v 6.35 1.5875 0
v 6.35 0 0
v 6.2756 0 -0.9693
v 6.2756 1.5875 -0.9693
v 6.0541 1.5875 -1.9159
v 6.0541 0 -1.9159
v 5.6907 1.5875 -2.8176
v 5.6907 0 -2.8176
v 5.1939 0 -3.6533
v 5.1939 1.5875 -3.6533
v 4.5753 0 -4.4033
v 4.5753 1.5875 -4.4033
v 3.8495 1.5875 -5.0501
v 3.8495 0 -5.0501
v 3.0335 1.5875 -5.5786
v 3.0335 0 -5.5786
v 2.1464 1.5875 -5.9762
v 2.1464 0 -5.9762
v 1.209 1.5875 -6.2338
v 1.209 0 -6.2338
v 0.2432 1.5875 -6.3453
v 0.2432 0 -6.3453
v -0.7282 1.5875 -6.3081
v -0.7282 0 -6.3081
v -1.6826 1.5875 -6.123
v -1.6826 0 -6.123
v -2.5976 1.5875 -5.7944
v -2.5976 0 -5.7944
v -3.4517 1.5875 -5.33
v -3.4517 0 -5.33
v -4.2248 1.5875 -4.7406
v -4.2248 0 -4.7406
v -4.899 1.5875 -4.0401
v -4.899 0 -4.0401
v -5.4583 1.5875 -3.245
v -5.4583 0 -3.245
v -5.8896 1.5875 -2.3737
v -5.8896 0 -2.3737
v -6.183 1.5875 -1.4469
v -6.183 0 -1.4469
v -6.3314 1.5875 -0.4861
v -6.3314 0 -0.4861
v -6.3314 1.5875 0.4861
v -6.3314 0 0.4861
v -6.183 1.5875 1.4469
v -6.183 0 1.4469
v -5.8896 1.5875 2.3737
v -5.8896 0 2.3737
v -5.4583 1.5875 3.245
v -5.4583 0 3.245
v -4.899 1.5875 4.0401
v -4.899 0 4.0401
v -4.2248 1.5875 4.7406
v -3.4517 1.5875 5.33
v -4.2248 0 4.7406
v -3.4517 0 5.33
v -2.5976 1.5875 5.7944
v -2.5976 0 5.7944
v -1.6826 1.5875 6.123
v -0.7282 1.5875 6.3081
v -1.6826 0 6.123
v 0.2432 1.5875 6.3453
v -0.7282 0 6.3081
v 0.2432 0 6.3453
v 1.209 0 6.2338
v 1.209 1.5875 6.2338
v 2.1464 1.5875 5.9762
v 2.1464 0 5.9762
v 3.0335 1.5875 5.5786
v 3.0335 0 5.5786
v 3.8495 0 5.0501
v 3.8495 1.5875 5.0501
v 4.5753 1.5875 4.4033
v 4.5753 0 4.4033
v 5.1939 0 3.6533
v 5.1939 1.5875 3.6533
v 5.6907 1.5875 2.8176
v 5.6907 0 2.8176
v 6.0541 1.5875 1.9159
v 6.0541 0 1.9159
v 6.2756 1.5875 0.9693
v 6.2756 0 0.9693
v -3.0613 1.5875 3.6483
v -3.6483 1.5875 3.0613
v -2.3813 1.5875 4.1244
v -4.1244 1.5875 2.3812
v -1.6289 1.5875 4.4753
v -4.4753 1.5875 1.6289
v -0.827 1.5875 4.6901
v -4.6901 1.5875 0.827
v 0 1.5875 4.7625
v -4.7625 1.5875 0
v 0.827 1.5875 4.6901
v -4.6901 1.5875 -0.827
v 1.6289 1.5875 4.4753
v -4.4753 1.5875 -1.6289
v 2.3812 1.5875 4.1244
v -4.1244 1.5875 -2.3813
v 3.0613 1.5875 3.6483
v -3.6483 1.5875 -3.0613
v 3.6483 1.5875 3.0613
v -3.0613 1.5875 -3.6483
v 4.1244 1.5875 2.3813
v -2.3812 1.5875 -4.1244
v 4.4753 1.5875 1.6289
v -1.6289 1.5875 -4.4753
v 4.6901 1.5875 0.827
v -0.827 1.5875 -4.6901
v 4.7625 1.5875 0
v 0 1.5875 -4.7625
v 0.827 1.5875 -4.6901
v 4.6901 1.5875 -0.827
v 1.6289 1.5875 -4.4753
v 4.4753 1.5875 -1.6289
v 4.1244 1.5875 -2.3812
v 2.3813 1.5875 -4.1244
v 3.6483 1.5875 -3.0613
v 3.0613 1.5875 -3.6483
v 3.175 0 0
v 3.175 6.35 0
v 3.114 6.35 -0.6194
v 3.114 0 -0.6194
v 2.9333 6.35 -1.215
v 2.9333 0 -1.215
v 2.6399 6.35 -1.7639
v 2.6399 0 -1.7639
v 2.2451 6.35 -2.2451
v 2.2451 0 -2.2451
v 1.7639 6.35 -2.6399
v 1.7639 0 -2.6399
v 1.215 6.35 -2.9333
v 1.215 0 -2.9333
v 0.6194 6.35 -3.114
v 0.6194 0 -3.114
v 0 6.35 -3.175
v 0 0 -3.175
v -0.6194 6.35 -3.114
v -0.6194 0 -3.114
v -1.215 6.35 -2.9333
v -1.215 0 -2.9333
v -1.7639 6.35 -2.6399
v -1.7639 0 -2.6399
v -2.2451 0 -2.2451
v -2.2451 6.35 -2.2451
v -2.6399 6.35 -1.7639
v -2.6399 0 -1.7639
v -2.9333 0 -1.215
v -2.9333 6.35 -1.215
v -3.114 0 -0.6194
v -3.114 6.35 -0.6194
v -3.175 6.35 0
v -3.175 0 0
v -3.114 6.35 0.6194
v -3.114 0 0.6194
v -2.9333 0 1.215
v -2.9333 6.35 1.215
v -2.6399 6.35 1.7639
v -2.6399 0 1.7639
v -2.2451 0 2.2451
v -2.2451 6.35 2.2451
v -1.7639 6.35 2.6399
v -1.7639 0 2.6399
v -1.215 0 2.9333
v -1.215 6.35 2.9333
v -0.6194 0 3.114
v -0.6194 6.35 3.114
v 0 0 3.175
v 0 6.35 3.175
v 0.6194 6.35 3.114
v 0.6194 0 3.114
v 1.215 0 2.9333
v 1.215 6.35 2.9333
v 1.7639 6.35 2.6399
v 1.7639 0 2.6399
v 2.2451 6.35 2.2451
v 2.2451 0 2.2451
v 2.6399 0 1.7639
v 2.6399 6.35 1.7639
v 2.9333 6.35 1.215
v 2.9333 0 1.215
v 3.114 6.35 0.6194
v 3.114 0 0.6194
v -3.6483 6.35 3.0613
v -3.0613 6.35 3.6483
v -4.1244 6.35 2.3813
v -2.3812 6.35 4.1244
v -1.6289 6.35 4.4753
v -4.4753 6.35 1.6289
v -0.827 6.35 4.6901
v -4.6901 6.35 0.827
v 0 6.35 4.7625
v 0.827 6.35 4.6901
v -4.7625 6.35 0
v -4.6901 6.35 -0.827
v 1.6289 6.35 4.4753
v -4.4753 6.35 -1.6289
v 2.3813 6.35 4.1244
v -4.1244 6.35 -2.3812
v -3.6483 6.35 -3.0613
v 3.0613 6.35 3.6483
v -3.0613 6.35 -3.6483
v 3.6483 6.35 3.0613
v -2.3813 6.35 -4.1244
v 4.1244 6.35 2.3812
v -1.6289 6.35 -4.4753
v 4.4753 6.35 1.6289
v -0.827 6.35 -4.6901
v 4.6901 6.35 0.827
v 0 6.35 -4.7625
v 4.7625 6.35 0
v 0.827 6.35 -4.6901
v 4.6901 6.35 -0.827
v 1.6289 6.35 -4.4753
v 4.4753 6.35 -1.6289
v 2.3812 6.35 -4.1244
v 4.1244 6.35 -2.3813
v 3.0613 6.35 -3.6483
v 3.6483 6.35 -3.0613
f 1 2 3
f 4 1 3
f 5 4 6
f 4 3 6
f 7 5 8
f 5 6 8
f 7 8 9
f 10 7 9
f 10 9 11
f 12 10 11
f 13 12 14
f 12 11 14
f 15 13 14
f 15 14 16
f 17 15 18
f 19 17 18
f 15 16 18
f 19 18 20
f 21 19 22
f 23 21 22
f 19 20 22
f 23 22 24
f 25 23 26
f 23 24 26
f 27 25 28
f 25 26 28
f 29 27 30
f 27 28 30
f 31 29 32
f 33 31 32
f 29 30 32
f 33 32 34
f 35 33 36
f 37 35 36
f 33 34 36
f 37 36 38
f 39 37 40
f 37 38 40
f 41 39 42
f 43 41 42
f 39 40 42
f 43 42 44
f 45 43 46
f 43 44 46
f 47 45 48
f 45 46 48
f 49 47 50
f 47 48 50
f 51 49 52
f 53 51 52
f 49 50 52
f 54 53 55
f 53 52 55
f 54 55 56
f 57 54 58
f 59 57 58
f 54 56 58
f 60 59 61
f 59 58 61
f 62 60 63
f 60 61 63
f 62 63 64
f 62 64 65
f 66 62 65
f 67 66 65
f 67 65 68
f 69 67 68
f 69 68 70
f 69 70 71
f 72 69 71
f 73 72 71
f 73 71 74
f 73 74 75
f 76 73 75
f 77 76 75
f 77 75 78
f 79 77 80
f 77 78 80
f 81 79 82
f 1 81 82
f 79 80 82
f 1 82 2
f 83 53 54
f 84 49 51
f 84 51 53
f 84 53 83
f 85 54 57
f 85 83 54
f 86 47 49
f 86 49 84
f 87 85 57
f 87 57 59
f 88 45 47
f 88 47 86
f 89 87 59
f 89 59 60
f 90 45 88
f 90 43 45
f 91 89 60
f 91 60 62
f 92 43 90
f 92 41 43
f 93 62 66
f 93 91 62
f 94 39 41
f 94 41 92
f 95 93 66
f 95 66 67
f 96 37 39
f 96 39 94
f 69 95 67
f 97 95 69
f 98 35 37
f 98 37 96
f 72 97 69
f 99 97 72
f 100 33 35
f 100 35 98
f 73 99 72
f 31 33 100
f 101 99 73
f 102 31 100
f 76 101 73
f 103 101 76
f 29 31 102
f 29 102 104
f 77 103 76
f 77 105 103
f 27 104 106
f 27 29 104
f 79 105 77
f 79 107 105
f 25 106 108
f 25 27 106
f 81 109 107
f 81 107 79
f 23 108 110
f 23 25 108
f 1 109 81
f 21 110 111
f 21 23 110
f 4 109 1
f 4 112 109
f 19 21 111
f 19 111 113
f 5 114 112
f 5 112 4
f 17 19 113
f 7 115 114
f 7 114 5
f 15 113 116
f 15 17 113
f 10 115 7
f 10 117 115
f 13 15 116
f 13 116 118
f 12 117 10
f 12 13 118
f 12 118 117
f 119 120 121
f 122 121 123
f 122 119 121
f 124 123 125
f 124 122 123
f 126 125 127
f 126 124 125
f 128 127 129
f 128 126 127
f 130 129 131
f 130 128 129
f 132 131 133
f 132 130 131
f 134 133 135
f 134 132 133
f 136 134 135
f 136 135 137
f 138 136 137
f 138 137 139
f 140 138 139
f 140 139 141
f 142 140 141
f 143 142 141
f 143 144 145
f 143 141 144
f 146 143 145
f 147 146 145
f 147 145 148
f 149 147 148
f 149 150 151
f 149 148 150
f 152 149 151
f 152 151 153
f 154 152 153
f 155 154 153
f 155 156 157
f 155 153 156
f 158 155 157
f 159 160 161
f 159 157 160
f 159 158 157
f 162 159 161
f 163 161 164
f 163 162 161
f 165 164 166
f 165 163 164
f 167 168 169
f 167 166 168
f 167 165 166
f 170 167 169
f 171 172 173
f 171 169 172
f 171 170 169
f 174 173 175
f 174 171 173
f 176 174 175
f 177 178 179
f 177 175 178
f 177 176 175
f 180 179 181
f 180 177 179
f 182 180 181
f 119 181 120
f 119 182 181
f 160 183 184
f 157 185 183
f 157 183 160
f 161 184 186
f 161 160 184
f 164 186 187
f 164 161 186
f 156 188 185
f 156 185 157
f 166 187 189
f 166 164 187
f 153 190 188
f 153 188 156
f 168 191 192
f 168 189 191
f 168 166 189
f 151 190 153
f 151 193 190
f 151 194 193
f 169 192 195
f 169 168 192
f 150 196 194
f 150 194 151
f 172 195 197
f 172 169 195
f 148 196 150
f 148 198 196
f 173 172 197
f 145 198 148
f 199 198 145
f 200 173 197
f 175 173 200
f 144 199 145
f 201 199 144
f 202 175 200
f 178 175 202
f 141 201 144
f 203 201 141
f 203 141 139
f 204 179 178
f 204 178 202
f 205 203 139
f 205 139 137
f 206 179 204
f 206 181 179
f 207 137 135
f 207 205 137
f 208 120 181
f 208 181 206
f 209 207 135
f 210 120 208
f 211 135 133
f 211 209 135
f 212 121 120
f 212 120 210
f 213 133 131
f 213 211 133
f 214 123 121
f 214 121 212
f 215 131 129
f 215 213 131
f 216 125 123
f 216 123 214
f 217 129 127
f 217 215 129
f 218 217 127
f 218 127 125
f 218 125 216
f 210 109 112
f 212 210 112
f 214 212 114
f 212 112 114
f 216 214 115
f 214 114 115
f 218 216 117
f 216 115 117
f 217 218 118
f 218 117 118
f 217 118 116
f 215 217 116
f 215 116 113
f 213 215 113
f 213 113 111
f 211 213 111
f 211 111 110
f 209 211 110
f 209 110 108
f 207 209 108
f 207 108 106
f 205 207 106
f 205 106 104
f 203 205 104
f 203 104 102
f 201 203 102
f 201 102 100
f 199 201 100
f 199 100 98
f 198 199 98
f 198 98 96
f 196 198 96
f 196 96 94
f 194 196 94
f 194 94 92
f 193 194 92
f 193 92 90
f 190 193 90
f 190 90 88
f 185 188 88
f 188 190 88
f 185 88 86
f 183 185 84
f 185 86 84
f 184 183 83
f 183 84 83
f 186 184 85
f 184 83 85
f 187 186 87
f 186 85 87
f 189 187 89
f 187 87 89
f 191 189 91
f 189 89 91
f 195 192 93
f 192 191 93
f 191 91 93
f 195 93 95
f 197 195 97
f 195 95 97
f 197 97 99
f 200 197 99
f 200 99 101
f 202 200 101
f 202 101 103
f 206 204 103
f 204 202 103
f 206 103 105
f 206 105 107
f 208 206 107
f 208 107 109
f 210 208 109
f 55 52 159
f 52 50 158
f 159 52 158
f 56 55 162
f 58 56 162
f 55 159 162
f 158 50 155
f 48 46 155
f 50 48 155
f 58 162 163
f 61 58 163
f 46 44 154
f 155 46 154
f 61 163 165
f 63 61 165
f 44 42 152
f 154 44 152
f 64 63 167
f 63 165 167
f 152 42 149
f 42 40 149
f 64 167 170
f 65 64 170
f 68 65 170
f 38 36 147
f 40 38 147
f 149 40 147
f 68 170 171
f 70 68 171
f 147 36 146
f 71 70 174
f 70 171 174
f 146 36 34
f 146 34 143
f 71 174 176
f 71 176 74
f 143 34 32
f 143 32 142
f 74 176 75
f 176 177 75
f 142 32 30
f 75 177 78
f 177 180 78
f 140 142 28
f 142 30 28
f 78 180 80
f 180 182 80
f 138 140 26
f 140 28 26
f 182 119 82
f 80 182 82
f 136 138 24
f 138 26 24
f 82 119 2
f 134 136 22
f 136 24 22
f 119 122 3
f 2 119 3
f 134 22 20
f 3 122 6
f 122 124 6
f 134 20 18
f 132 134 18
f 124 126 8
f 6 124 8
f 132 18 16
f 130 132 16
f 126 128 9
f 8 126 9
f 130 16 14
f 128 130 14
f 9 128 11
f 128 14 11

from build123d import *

# Parameters (mm, degrees)
SKETCH2_R           = 4.7625
SKETCH2_R_2         = 3.175
BOSS_EXTRUDE1_DEPTH = 9.525
SKETCH3_R           = 6.35
SKETCH3_R_2         = 4.7625
BOSS_EXTRUDE2_DEPTH = 1.5875
SKETCH4_R           = 6.35
CUT_EXTRUDE1_DEPTH  = 3.175


with BuildPart() as part:
    # Sketch2 → Boss-Extrude1 (new body)
    with BuildSketch(Plane(origin=(0, 0, 0), x_dir=(1, 0, 0), z_dir=(0, 1, 0))):
        Circle(SKETCH2_R)
        Circle(SKETCH2_R_2, mode=Mode.SUBTRACT)
    extrude(amount=BOSS_EXTRUDE1_DEPTH)

    # Sketch3 → Boss-Extrude2 (add)
    with BuildSketch(Plane(origin=(0, 0, 0), x_dir=(1, 0, 0), z_dir=(0, 1, 0))):
        Circle(SKETCH3_R)
        Circle(SKETCH3_R_2, mode=Mode.SUBTRACT)
    extrude(amount=BOSS_EXTRUDE2_DEPTH)

    # Sketch4 → Cut-Extrude1 (cut)
    with BuildSketch(Plane(origin=(0, 9.525, 0), x_dir=(1, 0, 0), z_dir=(0, 1, 0))):
        Circle(SKETCH4_R)
    extrude(amount=-CUT_EXTRUDE1_DEPTH, mode=Mode.SUBTRACT)


solid = part.part
